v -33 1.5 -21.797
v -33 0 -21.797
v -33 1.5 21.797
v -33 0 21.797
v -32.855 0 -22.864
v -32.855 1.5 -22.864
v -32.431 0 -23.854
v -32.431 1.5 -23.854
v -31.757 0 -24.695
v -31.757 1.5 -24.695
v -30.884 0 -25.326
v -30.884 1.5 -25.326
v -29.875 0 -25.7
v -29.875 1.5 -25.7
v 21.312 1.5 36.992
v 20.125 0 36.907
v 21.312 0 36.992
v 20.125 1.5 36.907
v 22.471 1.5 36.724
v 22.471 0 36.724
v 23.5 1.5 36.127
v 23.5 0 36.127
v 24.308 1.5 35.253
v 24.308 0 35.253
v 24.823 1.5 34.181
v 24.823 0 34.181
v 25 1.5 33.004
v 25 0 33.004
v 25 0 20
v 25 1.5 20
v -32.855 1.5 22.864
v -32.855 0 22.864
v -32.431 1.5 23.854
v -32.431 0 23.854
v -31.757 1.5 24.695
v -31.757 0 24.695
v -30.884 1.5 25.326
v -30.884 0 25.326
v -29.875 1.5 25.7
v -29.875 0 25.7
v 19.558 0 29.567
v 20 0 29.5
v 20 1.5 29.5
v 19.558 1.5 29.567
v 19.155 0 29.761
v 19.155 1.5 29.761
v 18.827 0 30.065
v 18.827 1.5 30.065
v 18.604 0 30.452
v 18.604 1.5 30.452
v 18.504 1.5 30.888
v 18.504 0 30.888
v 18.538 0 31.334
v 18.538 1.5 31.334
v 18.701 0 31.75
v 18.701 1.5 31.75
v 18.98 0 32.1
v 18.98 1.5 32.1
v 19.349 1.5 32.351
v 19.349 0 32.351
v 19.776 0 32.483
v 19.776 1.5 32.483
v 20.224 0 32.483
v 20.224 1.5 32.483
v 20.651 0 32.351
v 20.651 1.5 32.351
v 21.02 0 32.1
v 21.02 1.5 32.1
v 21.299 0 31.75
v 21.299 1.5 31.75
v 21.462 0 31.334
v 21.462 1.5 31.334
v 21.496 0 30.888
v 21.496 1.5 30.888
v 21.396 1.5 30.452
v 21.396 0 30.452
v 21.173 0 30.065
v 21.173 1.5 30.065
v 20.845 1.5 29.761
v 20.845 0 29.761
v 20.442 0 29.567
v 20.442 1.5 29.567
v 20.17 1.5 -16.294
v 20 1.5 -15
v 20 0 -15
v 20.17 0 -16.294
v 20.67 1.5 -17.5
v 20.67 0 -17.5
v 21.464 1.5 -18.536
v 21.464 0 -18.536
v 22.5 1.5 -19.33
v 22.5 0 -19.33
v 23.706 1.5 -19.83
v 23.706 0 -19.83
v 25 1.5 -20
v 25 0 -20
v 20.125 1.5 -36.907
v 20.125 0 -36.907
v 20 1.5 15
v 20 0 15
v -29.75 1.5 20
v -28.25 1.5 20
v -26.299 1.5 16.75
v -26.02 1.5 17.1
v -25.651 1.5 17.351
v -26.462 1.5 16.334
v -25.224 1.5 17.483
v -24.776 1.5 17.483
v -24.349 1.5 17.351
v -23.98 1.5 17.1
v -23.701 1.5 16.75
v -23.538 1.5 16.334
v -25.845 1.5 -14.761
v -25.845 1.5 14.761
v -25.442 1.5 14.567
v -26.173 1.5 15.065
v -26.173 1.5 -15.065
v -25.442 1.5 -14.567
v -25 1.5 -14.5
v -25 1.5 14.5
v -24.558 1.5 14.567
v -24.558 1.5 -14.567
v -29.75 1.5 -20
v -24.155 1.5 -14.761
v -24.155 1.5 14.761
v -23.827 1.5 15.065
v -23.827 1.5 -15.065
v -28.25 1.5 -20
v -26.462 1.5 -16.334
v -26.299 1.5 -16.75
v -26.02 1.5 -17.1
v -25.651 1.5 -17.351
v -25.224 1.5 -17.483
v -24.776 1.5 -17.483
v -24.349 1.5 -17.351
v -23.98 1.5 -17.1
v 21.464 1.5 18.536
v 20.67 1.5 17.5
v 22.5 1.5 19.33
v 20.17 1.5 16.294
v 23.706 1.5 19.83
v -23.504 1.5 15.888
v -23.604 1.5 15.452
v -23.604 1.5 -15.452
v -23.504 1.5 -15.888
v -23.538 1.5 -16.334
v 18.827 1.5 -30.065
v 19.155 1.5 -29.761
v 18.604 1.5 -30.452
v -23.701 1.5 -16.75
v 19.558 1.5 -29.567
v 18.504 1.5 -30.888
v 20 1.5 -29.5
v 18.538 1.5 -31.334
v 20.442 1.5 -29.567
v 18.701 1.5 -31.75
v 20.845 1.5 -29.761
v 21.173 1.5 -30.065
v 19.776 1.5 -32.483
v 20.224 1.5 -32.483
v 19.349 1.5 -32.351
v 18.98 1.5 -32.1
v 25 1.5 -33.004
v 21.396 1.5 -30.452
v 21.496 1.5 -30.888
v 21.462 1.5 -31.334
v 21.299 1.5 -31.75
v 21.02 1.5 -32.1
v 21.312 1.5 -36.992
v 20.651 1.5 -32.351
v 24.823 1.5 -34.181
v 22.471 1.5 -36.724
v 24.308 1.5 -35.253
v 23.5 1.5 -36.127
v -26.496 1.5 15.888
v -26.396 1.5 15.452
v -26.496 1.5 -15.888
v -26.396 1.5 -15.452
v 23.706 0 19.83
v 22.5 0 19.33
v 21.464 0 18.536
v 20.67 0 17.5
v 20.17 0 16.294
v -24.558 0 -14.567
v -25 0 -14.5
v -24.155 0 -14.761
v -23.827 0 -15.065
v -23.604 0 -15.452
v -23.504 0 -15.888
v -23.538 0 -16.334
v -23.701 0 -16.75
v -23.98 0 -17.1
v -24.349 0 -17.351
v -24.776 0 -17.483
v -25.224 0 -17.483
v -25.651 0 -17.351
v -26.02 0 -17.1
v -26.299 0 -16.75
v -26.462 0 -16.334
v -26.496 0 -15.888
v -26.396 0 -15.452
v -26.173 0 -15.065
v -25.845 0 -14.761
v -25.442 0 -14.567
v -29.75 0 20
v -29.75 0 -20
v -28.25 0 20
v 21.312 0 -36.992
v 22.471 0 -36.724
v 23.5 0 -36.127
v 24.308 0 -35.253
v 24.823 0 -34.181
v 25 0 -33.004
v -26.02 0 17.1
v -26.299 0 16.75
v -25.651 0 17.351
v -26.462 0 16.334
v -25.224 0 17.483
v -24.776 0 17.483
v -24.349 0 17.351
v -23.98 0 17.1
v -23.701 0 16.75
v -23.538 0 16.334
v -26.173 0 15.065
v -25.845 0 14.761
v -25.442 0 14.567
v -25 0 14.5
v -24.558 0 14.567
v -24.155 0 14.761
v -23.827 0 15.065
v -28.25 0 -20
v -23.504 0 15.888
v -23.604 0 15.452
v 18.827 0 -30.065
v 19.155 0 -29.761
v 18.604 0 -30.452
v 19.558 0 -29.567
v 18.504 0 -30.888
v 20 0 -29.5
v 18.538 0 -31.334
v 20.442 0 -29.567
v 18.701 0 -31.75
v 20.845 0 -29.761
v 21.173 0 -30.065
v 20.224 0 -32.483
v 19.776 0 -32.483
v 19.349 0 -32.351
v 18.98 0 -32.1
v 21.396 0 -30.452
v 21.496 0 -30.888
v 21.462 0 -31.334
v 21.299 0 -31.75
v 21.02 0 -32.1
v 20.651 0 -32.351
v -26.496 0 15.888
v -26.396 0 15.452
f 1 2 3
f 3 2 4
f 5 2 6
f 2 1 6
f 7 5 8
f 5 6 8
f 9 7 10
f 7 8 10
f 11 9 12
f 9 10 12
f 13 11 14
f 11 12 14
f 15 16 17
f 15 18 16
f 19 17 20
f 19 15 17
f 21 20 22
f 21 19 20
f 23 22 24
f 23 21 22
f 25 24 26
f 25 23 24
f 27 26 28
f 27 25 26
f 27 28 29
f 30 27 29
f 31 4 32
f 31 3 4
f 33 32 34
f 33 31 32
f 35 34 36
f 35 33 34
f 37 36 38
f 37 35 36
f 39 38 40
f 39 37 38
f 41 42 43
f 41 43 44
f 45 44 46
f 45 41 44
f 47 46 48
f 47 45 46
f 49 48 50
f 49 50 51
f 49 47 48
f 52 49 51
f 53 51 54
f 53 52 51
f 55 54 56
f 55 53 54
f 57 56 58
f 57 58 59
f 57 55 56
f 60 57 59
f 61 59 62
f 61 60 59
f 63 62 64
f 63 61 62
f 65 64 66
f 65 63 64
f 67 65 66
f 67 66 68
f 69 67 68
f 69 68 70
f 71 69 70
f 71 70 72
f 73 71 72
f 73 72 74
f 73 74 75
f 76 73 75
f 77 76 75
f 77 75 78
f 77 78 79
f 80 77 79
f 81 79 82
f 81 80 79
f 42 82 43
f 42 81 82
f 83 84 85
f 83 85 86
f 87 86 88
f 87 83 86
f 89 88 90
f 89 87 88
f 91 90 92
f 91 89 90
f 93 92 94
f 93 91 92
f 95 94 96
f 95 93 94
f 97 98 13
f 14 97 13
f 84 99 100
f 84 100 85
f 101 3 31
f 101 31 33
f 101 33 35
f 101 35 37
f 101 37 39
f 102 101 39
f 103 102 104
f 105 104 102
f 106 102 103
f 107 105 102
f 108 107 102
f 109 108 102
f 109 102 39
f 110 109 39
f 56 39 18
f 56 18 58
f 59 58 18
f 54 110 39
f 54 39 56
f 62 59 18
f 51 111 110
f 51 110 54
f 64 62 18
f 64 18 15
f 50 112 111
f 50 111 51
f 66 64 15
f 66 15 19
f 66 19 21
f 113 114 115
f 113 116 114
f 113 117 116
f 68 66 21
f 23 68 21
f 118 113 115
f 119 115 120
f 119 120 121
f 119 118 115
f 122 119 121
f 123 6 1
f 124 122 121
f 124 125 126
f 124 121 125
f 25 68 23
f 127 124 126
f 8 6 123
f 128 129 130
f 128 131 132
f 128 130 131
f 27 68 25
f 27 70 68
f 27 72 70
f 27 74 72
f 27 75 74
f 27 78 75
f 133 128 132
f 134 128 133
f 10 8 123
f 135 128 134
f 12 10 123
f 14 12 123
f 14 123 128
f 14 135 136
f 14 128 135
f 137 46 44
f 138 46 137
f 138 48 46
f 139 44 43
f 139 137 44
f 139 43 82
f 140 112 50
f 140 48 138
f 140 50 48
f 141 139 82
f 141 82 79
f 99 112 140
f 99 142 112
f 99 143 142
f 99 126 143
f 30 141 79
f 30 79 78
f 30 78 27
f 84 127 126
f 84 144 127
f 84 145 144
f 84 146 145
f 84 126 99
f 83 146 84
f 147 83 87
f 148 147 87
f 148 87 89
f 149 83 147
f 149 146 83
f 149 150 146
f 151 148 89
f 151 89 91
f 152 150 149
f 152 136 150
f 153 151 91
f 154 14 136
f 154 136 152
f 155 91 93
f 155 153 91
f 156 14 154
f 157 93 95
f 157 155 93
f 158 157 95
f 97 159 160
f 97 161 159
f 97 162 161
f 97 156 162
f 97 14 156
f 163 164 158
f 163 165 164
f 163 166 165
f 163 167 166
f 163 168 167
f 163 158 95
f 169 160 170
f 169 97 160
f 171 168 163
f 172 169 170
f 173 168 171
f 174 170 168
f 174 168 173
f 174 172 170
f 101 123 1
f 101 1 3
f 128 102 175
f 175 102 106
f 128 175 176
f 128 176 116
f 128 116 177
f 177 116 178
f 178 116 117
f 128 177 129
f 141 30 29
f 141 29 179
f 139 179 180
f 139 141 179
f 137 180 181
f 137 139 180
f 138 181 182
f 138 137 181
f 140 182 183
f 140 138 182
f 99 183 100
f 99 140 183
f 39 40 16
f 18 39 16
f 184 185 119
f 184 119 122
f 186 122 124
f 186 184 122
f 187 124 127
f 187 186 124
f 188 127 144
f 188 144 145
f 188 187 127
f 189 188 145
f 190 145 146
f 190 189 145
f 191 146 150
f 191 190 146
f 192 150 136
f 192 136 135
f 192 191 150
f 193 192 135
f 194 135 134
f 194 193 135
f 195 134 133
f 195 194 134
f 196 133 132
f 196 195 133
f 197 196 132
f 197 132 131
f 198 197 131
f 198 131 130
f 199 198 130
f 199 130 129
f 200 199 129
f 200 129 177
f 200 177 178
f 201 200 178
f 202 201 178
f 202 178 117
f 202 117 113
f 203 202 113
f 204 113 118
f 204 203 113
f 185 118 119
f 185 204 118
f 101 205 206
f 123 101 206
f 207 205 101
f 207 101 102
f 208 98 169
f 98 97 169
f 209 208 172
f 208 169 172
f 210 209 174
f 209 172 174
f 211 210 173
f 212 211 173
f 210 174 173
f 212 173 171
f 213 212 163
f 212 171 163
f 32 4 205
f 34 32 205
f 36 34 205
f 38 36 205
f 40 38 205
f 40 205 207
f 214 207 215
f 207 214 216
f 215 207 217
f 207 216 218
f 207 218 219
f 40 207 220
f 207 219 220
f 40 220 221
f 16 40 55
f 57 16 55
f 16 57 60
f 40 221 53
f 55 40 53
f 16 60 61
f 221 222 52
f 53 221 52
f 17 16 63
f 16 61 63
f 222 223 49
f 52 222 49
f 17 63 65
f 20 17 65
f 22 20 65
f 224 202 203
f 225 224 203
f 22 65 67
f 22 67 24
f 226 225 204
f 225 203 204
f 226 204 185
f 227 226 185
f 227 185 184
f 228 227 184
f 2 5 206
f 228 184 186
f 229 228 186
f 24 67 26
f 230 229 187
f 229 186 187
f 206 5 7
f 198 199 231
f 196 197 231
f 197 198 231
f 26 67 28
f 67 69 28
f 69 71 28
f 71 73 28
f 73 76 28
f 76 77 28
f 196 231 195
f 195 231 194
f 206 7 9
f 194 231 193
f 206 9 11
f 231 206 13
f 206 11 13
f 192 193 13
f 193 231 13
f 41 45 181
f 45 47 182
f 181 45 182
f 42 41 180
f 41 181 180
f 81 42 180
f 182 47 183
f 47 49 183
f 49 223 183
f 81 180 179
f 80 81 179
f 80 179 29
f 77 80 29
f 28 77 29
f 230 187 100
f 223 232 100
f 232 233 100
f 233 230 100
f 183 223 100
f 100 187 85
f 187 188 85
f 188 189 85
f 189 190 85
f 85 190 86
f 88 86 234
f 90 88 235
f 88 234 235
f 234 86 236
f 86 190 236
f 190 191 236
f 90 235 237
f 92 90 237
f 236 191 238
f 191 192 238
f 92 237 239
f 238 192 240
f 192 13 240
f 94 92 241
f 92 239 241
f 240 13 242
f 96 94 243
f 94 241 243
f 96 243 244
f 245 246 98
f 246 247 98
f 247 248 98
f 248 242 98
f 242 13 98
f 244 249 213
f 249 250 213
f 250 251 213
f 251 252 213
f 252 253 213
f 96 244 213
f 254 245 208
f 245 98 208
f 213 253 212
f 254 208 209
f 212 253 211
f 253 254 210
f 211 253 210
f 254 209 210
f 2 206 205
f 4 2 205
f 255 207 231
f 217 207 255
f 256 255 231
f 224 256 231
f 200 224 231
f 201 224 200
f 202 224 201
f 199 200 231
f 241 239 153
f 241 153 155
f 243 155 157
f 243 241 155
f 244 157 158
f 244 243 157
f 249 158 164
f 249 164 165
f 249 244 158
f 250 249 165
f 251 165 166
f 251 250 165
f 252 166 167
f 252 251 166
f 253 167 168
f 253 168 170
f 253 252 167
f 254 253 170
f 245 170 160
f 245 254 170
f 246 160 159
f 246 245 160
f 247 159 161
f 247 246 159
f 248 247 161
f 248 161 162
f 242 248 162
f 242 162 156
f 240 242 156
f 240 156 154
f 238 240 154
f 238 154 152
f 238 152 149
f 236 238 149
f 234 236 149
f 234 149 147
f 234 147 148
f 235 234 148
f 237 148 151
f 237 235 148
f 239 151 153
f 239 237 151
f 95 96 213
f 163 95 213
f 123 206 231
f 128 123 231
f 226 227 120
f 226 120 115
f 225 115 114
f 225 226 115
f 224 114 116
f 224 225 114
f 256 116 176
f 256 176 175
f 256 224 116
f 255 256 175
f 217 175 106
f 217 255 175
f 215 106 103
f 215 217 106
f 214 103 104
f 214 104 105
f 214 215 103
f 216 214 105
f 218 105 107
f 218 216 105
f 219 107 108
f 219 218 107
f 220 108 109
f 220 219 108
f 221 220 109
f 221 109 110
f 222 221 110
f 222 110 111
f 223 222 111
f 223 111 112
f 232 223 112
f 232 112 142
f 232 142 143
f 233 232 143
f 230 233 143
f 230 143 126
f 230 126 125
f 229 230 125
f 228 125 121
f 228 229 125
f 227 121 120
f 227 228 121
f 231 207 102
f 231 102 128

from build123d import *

# Parameters (mm, degrees)
SKETCH_1_R          = 1.5
SKETCH_1_W          = 1.5
SKETCH_1_H          = 40
EXTRUDE_1_DEPTH     = 1.5
CUT_EXTRUDE_2_DEPTH = 51.351266121
FILLET_1_R          = 4


with BuildPart() as part:
    # 草图1 → 凸台-拉伸1 (new body)
    with BuildSketch(Plane(origin=(0, 0, 0), x_dir=(1, 0, 0), z_dir=(0, 1, 0))):
        Polygon((-33, 25), (-33, -25), (25, -38), (25, 38), align=None)
        with Locations(Location((-25, 16, 0), (0, 0, 270))):
            Circle(SKETCH_1_R, mode=Mode.SUBTRACT)
        with Locations(Location((20, 31, 0), (0, 0, 270))):
            Circle(SKETCH_1_R, mode=Mode.SUBTRACT)
        with Locations(Location((20, -31, 0), (0, 0, 90))):
            Circle(SKETCH_1_R, mode=Mode.SUBTRACT)
        with Locations(Location((-25, -16, 0), (0, 0, 90))):
            Circle(SKETCH_1_R, mode=Mode.SUBTRACT)
        with Locations((-29, 0)):
            Rectangle(SKETCH_1_W, SKETCH_1_H, mode=Mode.SUBTRACT)
    extrude(amount=EXTRUDE_1_DEPTH)

    # 草图3 → 切除-拉伸2 (cut, through all)
    with BuildSketch(Plane(origin=(0, 1.5, 0), x_dir=(1, 0, 0), z_dir=(0, 1, 0))):
        with BuildLine():
            Line((20, -15), (20, 15))
            ThreePointArc((20, 15), (25, 20), (30, 15))
            Line((30, 15), (30, -15))
            ThreePointArc((30, -15), (25, -20), (20, -15))
        make_face()
    extrude(amount=-CUT_EXTRUDE_2_DEPTH, mode=Mode.SUBTRACT)

    # 圆角1
    fillet_1_edges = [part.edges().sort_by_distance(p)[0] for p in [
        (25, 0.75, -38),
        (25, 0.75, 38),
        (-33, 0.75, 25),
        (-33, 0.75, -25),
    ]]
    fillet(fillet_1_edges, radius=FILLET_1_R)


solid = part.part
